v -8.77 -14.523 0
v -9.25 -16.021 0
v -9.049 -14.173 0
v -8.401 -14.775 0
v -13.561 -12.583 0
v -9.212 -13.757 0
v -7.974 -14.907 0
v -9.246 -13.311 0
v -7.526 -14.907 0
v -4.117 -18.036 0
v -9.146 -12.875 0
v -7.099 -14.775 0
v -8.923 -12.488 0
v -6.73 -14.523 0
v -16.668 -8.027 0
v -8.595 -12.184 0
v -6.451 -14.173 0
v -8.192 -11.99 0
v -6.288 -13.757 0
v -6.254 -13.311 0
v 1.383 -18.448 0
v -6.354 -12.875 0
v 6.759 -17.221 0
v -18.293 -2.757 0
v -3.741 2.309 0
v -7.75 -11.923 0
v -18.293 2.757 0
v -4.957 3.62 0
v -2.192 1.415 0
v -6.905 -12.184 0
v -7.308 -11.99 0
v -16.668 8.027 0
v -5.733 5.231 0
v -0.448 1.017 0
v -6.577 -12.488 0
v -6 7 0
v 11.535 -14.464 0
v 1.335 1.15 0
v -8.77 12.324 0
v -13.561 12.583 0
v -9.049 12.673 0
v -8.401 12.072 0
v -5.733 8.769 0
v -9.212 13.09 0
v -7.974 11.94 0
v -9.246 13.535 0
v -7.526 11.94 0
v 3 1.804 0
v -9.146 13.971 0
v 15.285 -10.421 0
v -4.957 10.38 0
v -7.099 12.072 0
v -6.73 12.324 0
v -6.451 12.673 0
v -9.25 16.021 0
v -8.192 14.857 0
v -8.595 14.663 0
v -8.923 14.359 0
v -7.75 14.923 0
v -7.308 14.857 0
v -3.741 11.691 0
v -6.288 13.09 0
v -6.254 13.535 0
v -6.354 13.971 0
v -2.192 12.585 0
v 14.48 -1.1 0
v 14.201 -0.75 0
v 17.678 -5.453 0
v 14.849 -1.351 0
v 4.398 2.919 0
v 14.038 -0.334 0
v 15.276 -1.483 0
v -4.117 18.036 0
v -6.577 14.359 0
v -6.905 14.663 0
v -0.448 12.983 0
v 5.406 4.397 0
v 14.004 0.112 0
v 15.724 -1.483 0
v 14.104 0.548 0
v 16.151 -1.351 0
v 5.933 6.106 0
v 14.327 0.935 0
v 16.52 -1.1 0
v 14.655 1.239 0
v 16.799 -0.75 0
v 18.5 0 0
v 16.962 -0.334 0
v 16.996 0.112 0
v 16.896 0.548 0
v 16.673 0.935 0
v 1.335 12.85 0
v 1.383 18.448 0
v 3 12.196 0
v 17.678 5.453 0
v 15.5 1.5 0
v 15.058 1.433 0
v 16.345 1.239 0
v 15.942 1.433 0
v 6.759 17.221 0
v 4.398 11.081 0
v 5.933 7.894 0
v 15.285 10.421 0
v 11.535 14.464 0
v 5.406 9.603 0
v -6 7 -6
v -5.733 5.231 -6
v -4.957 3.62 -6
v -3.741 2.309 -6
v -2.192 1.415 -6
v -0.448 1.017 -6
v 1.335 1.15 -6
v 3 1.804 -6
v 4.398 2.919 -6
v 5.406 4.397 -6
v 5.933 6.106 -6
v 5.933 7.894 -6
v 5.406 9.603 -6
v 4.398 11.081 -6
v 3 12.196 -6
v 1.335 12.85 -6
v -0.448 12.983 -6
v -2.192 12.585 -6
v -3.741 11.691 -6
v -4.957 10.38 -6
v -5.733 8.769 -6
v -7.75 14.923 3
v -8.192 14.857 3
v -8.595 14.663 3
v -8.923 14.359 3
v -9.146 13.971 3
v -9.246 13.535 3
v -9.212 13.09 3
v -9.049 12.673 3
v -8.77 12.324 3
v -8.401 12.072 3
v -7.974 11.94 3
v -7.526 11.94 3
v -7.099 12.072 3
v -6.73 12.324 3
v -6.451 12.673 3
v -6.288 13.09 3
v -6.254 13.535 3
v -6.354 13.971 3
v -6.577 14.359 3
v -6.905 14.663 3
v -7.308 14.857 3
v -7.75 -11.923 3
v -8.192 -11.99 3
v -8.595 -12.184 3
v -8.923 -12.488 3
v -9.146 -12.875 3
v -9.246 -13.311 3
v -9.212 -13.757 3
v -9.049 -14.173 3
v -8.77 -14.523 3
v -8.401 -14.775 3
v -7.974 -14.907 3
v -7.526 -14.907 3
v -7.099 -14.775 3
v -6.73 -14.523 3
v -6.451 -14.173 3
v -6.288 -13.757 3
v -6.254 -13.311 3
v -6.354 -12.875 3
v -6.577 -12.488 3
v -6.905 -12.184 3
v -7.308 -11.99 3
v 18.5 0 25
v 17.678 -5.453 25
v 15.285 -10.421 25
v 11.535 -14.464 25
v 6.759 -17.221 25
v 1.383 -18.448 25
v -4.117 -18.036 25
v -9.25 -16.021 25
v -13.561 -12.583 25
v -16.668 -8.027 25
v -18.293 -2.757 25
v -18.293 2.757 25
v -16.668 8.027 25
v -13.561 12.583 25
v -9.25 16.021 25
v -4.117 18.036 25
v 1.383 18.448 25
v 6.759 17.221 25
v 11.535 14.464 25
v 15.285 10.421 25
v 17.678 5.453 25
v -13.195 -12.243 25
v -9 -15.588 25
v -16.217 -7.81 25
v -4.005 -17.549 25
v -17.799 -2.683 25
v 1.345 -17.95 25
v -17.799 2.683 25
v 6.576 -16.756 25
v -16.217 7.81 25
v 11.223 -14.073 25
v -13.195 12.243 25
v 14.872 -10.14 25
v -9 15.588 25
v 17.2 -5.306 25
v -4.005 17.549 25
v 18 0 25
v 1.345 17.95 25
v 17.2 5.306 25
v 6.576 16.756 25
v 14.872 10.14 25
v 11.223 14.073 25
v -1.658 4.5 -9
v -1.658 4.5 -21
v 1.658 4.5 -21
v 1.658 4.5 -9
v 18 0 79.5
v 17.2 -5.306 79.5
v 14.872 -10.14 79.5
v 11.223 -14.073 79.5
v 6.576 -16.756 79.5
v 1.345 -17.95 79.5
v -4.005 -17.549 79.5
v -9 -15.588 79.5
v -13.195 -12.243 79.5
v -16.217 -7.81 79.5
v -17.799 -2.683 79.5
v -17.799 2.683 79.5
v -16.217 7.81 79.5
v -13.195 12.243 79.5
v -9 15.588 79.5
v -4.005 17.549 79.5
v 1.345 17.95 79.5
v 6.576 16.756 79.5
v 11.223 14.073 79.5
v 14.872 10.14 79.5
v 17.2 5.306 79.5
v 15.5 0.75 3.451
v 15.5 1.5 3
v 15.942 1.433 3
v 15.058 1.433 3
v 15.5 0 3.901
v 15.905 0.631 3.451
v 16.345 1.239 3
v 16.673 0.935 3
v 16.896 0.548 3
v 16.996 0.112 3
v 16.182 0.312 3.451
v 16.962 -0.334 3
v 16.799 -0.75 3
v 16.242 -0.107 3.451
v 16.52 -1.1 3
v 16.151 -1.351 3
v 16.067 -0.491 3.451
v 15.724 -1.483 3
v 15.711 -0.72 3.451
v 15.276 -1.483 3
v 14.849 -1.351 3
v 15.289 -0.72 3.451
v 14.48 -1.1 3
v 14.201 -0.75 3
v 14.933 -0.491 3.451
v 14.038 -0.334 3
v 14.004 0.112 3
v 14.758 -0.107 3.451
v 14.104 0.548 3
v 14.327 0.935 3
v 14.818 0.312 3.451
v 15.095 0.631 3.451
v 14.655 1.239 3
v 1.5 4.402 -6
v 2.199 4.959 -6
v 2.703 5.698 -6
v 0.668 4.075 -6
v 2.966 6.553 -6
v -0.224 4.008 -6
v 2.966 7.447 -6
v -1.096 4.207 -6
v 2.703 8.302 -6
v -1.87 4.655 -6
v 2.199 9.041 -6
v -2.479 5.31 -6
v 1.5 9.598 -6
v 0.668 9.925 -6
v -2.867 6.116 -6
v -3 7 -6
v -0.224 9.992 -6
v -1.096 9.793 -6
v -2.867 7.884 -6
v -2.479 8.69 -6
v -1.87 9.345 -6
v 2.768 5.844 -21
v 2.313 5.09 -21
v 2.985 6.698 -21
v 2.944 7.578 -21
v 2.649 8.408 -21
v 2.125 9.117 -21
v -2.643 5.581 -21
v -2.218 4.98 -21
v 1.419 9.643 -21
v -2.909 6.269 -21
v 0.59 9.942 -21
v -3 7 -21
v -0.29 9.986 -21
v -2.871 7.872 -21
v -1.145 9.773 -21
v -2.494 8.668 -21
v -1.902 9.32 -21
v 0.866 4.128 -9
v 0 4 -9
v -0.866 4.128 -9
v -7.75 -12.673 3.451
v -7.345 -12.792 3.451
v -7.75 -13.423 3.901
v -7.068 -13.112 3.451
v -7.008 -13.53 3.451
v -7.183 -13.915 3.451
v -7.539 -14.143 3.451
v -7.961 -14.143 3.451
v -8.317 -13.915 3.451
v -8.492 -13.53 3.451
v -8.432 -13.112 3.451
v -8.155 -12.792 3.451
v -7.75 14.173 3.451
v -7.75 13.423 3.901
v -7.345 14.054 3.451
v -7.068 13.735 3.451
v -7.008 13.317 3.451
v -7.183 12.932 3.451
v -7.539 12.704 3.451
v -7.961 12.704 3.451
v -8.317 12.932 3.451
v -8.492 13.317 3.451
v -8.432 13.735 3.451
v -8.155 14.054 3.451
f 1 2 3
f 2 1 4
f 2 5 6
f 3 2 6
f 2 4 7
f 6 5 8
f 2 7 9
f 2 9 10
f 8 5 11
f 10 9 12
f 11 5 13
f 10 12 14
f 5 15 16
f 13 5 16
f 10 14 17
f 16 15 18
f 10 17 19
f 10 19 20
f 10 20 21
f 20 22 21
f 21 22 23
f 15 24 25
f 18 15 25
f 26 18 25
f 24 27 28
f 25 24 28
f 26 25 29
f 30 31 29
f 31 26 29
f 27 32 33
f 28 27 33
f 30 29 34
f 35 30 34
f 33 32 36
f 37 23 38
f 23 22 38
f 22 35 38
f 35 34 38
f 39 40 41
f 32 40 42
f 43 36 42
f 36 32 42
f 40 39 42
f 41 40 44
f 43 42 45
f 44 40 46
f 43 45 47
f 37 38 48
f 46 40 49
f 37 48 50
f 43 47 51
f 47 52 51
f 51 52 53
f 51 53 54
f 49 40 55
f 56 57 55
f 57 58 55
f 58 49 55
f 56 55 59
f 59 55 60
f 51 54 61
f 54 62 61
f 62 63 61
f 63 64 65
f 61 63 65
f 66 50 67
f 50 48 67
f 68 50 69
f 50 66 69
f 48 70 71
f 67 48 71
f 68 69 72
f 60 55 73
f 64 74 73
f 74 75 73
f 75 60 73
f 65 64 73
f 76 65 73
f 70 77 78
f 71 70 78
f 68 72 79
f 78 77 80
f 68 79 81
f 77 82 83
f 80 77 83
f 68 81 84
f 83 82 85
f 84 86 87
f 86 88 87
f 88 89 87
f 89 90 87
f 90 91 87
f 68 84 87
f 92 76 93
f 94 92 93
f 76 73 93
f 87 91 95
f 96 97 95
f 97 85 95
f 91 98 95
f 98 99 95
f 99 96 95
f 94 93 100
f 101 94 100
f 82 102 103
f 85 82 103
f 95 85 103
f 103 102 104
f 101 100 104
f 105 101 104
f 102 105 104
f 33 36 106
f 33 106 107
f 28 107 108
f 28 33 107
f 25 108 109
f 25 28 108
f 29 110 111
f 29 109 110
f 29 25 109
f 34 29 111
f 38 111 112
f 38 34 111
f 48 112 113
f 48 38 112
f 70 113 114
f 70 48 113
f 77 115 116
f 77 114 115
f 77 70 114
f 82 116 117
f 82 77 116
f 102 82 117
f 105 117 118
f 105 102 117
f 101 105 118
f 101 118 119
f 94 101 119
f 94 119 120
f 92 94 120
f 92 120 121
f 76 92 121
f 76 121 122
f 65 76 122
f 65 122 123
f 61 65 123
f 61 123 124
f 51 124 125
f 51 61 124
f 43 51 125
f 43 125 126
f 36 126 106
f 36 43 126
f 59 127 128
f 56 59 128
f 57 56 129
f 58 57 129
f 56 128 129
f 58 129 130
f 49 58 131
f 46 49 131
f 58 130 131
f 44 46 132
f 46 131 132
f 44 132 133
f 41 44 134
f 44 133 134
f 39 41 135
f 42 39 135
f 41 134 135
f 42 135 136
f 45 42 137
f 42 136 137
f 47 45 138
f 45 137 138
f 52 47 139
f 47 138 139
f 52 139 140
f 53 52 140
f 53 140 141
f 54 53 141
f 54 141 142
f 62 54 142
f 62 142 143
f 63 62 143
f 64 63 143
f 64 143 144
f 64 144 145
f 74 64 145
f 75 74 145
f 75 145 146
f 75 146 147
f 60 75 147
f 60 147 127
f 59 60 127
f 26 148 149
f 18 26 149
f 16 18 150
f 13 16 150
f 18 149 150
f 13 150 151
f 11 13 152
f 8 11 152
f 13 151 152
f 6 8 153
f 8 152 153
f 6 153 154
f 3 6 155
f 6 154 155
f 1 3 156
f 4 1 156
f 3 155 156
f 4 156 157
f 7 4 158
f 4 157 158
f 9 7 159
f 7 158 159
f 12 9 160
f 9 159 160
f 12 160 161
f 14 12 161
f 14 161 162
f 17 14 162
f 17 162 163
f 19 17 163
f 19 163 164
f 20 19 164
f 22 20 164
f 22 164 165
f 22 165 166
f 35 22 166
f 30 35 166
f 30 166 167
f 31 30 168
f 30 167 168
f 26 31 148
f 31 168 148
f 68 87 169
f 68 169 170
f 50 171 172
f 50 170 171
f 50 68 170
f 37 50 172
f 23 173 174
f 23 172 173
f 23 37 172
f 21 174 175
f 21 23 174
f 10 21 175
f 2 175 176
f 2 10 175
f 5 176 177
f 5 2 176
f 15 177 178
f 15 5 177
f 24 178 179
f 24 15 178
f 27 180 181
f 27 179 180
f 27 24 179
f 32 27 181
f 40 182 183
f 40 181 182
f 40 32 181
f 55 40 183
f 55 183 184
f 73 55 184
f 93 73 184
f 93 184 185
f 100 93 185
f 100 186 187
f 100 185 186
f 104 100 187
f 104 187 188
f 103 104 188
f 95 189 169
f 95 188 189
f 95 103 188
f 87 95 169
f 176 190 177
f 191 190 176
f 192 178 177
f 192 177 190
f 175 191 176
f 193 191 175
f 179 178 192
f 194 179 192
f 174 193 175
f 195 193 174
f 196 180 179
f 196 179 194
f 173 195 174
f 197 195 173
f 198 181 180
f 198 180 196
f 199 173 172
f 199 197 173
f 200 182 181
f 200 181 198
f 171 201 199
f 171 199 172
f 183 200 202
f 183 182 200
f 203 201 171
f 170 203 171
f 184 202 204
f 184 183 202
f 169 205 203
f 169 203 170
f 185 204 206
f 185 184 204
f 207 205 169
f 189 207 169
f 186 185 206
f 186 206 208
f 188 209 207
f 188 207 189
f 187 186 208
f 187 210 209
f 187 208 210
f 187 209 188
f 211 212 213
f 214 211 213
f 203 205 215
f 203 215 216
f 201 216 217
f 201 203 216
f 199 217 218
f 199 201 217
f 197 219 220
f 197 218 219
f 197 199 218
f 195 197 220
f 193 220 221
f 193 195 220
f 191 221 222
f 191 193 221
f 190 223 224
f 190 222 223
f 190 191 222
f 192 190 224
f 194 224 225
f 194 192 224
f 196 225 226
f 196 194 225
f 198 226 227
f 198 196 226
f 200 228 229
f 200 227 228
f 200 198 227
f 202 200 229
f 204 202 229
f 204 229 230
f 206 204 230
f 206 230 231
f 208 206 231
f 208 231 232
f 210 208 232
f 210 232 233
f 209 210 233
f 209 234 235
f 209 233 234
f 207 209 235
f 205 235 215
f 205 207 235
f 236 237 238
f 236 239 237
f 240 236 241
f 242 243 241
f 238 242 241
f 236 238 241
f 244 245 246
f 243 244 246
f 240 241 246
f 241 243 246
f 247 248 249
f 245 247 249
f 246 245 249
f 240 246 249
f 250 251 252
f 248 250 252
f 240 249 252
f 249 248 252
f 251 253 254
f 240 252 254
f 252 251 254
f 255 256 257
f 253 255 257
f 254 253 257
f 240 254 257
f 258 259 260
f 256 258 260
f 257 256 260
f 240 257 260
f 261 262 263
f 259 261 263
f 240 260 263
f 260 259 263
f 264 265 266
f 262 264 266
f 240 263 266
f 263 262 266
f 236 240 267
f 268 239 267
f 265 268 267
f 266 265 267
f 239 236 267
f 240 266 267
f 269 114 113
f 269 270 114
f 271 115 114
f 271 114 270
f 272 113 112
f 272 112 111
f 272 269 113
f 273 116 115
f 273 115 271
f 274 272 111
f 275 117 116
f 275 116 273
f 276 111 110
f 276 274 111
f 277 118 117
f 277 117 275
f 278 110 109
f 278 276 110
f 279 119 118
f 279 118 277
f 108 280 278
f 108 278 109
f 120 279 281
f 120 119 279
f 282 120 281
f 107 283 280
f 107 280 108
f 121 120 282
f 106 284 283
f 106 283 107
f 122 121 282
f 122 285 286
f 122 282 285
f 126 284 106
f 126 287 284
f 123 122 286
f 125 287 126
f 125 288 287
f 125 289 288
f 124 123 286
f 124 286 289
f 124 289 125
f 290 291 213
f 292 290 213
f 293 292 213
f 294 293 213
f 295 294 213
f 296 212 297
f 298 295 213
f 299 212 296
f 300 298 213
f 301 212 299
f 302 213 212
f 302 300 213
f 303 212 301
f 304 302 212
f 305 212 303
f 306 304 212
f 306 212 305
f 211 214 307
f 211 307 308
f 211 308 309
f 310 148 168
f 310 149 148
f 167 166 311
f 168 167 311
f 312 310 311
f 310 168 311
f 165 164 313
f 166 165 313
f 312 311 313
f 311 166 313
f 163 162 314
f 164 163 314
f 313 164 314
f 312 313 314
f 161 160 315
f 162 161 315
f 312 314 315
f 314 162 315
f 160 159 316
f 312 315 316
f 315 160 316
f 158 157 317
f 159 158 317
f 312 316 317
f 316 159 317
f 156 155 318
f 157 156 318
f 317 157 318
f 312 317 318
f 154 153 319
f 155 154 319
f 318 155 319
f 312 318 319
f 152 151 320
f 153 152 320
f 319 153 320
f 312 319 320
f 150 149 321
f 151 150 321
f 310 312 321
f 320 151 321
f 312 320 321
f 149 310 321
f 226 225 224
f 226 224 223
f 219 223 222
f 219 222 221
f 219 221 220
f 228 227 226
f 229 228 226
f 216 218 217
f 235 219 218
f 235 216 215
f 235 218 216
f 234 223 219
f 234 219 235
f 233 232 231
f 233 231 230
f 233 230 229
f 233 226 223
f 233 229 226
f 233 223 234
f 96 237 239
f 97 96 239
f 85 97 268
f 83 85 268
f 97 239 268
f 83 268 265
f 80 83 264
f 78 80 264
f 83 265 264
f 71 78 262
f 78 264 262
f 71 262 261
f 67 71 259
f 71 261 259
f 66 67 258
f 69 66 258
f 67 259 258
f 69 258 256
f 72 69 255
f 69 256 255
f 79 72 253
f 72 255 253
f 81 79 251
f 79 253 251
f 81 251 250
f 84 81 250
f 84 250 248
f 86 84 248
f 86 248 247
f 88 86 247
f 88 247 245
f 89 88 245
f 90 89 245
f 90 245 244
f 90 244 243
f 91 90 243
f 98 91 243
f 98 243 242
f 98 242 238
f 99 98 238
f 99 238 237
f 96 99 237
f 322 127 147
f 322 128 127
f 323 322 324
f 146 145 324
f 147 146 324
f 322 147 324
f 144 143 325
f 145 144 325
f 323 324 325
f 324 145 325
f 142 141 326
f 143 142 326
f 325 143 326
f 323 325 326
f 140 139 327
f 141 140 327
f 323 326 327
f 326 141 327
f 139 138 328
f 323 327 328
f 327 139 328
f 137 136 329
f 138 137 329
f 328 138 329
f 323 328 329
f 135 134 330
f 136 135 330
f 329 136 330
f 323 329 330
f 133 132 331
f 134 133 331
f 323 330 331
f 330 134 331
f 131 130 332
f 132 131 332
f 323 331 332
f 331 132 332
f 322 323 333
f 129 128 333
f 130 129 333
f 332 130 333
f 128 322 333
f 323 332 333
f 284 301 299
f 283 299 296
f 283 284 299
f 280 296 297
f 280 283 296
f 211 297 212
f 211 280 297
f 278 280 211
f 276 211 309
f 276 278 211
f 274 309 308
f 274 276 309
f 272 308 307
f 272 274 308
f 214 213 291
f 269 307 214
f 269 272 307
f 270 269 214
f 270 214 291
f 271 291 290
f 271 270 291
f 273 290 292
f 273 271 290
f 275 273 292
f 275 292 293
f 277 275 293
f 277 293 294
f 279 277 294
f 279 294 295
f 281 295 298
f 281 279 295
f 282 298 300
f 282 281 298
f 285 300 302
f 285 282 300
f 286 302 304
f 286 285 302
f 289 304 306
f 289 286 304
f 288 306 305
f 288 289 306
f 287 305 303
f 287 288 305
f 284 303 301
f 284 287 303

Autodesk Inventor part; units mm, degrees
ref_plane "YZ Plane" through (0, 0, 0) normal (1, 0, 0) x (0, 1, 0)
ref_plane "XZ Plane" through (0, 0, 0) normal (0, 1, 0) x (-1, 0, 0)
sketch "スケッチ1" plane through (0, 0, 0) normal (0, 0, 1) x (1, 0, 0)
  circle A0 centre (0, 0) radius 18.5
  dimension "d0" = 37
extrude "押し出し1" add sketch "スケッチ1" along normal blind 25
sketch "スケッチ2" plane through (0, 0, 25) normal (0, 0, 1) x (1, 0, 0)
  circle A0 centre (0, 0) radius 18
  dimension "d3" = 36
extrude "押し出し2" add sketch "スケッチ2" along normal blind 54.5
sketch "スケッチ3" plane through (0, 0, 0) normal (0, 0, -1) x (-1, 0, 0)
  circle A0 centre (0, 0) radius 18.5 projected
  circle A1 centre (0, 7) radius 6
  dimension "d6" = 12
  dimension "d7" = 7
extrude "押し出し3" add sketch "スケッチ3" along normal blind 6 contours A1
sketch "スケッチ4" plane through (0, 7, -6) normal (0, 0, -1) x (-1, 0, 0)
  circle A0 centre (0, 0) radius 3
  point P0 (0, -7)
  dimension "d10" = 6
extrude "押し出し4" add sketch "スケッチ4" along normal blind 15
sketch "スケッチ5" plane through (0, 0, 0) normal (0, 0, -1) x (-1, 0, 0)
  circle A0 centre (0, 0) radius 18.5 projected
  circle A1 centre (0, 0) radius 15.5
  line L0 (0, 0) -> (-15.5, 0)
  line L1 (7.75, 13.4234) -> (0, 0)
  line L2 (0, 0) -> (7.75, -13.4234)
  point P0 (-15.5, 0)
  point P1 (7.75, -13.4234)
  dimension "d13" = 31
  dimension "d14" = 120
  dimension "d15" = 120
hole "Hole1" at (15.5, 0, 0) at (-7.75, -13.4234, 0) at (-7.75, 13.4234, 0) direction (0, 0, 1) diameter 3 depth 3 tip angle 118
ref_plane "作業平面1" through (0, 0, 0) normal (1, 0, 0) x (0, 0.3162, -0.9487)
sketch "スケッチ7" plane through (0, 7, -21) normal (0, 0, -1) x (-1, 0, 0)
  line L0 (1.6583, -2.5) -> (-1.6583, -2.5)
  circle A0 centre (0, 0) radius 3 projected
  point P0 (0, -7)
  dimension "d33" = 2.5
extrude "押し出し5" cut sketch "スケッチ7" against normal blind 12 contours A0 L0 picked at (0.3442, -2.6056)
properties part number "rs380ph_36" material "Steel"
